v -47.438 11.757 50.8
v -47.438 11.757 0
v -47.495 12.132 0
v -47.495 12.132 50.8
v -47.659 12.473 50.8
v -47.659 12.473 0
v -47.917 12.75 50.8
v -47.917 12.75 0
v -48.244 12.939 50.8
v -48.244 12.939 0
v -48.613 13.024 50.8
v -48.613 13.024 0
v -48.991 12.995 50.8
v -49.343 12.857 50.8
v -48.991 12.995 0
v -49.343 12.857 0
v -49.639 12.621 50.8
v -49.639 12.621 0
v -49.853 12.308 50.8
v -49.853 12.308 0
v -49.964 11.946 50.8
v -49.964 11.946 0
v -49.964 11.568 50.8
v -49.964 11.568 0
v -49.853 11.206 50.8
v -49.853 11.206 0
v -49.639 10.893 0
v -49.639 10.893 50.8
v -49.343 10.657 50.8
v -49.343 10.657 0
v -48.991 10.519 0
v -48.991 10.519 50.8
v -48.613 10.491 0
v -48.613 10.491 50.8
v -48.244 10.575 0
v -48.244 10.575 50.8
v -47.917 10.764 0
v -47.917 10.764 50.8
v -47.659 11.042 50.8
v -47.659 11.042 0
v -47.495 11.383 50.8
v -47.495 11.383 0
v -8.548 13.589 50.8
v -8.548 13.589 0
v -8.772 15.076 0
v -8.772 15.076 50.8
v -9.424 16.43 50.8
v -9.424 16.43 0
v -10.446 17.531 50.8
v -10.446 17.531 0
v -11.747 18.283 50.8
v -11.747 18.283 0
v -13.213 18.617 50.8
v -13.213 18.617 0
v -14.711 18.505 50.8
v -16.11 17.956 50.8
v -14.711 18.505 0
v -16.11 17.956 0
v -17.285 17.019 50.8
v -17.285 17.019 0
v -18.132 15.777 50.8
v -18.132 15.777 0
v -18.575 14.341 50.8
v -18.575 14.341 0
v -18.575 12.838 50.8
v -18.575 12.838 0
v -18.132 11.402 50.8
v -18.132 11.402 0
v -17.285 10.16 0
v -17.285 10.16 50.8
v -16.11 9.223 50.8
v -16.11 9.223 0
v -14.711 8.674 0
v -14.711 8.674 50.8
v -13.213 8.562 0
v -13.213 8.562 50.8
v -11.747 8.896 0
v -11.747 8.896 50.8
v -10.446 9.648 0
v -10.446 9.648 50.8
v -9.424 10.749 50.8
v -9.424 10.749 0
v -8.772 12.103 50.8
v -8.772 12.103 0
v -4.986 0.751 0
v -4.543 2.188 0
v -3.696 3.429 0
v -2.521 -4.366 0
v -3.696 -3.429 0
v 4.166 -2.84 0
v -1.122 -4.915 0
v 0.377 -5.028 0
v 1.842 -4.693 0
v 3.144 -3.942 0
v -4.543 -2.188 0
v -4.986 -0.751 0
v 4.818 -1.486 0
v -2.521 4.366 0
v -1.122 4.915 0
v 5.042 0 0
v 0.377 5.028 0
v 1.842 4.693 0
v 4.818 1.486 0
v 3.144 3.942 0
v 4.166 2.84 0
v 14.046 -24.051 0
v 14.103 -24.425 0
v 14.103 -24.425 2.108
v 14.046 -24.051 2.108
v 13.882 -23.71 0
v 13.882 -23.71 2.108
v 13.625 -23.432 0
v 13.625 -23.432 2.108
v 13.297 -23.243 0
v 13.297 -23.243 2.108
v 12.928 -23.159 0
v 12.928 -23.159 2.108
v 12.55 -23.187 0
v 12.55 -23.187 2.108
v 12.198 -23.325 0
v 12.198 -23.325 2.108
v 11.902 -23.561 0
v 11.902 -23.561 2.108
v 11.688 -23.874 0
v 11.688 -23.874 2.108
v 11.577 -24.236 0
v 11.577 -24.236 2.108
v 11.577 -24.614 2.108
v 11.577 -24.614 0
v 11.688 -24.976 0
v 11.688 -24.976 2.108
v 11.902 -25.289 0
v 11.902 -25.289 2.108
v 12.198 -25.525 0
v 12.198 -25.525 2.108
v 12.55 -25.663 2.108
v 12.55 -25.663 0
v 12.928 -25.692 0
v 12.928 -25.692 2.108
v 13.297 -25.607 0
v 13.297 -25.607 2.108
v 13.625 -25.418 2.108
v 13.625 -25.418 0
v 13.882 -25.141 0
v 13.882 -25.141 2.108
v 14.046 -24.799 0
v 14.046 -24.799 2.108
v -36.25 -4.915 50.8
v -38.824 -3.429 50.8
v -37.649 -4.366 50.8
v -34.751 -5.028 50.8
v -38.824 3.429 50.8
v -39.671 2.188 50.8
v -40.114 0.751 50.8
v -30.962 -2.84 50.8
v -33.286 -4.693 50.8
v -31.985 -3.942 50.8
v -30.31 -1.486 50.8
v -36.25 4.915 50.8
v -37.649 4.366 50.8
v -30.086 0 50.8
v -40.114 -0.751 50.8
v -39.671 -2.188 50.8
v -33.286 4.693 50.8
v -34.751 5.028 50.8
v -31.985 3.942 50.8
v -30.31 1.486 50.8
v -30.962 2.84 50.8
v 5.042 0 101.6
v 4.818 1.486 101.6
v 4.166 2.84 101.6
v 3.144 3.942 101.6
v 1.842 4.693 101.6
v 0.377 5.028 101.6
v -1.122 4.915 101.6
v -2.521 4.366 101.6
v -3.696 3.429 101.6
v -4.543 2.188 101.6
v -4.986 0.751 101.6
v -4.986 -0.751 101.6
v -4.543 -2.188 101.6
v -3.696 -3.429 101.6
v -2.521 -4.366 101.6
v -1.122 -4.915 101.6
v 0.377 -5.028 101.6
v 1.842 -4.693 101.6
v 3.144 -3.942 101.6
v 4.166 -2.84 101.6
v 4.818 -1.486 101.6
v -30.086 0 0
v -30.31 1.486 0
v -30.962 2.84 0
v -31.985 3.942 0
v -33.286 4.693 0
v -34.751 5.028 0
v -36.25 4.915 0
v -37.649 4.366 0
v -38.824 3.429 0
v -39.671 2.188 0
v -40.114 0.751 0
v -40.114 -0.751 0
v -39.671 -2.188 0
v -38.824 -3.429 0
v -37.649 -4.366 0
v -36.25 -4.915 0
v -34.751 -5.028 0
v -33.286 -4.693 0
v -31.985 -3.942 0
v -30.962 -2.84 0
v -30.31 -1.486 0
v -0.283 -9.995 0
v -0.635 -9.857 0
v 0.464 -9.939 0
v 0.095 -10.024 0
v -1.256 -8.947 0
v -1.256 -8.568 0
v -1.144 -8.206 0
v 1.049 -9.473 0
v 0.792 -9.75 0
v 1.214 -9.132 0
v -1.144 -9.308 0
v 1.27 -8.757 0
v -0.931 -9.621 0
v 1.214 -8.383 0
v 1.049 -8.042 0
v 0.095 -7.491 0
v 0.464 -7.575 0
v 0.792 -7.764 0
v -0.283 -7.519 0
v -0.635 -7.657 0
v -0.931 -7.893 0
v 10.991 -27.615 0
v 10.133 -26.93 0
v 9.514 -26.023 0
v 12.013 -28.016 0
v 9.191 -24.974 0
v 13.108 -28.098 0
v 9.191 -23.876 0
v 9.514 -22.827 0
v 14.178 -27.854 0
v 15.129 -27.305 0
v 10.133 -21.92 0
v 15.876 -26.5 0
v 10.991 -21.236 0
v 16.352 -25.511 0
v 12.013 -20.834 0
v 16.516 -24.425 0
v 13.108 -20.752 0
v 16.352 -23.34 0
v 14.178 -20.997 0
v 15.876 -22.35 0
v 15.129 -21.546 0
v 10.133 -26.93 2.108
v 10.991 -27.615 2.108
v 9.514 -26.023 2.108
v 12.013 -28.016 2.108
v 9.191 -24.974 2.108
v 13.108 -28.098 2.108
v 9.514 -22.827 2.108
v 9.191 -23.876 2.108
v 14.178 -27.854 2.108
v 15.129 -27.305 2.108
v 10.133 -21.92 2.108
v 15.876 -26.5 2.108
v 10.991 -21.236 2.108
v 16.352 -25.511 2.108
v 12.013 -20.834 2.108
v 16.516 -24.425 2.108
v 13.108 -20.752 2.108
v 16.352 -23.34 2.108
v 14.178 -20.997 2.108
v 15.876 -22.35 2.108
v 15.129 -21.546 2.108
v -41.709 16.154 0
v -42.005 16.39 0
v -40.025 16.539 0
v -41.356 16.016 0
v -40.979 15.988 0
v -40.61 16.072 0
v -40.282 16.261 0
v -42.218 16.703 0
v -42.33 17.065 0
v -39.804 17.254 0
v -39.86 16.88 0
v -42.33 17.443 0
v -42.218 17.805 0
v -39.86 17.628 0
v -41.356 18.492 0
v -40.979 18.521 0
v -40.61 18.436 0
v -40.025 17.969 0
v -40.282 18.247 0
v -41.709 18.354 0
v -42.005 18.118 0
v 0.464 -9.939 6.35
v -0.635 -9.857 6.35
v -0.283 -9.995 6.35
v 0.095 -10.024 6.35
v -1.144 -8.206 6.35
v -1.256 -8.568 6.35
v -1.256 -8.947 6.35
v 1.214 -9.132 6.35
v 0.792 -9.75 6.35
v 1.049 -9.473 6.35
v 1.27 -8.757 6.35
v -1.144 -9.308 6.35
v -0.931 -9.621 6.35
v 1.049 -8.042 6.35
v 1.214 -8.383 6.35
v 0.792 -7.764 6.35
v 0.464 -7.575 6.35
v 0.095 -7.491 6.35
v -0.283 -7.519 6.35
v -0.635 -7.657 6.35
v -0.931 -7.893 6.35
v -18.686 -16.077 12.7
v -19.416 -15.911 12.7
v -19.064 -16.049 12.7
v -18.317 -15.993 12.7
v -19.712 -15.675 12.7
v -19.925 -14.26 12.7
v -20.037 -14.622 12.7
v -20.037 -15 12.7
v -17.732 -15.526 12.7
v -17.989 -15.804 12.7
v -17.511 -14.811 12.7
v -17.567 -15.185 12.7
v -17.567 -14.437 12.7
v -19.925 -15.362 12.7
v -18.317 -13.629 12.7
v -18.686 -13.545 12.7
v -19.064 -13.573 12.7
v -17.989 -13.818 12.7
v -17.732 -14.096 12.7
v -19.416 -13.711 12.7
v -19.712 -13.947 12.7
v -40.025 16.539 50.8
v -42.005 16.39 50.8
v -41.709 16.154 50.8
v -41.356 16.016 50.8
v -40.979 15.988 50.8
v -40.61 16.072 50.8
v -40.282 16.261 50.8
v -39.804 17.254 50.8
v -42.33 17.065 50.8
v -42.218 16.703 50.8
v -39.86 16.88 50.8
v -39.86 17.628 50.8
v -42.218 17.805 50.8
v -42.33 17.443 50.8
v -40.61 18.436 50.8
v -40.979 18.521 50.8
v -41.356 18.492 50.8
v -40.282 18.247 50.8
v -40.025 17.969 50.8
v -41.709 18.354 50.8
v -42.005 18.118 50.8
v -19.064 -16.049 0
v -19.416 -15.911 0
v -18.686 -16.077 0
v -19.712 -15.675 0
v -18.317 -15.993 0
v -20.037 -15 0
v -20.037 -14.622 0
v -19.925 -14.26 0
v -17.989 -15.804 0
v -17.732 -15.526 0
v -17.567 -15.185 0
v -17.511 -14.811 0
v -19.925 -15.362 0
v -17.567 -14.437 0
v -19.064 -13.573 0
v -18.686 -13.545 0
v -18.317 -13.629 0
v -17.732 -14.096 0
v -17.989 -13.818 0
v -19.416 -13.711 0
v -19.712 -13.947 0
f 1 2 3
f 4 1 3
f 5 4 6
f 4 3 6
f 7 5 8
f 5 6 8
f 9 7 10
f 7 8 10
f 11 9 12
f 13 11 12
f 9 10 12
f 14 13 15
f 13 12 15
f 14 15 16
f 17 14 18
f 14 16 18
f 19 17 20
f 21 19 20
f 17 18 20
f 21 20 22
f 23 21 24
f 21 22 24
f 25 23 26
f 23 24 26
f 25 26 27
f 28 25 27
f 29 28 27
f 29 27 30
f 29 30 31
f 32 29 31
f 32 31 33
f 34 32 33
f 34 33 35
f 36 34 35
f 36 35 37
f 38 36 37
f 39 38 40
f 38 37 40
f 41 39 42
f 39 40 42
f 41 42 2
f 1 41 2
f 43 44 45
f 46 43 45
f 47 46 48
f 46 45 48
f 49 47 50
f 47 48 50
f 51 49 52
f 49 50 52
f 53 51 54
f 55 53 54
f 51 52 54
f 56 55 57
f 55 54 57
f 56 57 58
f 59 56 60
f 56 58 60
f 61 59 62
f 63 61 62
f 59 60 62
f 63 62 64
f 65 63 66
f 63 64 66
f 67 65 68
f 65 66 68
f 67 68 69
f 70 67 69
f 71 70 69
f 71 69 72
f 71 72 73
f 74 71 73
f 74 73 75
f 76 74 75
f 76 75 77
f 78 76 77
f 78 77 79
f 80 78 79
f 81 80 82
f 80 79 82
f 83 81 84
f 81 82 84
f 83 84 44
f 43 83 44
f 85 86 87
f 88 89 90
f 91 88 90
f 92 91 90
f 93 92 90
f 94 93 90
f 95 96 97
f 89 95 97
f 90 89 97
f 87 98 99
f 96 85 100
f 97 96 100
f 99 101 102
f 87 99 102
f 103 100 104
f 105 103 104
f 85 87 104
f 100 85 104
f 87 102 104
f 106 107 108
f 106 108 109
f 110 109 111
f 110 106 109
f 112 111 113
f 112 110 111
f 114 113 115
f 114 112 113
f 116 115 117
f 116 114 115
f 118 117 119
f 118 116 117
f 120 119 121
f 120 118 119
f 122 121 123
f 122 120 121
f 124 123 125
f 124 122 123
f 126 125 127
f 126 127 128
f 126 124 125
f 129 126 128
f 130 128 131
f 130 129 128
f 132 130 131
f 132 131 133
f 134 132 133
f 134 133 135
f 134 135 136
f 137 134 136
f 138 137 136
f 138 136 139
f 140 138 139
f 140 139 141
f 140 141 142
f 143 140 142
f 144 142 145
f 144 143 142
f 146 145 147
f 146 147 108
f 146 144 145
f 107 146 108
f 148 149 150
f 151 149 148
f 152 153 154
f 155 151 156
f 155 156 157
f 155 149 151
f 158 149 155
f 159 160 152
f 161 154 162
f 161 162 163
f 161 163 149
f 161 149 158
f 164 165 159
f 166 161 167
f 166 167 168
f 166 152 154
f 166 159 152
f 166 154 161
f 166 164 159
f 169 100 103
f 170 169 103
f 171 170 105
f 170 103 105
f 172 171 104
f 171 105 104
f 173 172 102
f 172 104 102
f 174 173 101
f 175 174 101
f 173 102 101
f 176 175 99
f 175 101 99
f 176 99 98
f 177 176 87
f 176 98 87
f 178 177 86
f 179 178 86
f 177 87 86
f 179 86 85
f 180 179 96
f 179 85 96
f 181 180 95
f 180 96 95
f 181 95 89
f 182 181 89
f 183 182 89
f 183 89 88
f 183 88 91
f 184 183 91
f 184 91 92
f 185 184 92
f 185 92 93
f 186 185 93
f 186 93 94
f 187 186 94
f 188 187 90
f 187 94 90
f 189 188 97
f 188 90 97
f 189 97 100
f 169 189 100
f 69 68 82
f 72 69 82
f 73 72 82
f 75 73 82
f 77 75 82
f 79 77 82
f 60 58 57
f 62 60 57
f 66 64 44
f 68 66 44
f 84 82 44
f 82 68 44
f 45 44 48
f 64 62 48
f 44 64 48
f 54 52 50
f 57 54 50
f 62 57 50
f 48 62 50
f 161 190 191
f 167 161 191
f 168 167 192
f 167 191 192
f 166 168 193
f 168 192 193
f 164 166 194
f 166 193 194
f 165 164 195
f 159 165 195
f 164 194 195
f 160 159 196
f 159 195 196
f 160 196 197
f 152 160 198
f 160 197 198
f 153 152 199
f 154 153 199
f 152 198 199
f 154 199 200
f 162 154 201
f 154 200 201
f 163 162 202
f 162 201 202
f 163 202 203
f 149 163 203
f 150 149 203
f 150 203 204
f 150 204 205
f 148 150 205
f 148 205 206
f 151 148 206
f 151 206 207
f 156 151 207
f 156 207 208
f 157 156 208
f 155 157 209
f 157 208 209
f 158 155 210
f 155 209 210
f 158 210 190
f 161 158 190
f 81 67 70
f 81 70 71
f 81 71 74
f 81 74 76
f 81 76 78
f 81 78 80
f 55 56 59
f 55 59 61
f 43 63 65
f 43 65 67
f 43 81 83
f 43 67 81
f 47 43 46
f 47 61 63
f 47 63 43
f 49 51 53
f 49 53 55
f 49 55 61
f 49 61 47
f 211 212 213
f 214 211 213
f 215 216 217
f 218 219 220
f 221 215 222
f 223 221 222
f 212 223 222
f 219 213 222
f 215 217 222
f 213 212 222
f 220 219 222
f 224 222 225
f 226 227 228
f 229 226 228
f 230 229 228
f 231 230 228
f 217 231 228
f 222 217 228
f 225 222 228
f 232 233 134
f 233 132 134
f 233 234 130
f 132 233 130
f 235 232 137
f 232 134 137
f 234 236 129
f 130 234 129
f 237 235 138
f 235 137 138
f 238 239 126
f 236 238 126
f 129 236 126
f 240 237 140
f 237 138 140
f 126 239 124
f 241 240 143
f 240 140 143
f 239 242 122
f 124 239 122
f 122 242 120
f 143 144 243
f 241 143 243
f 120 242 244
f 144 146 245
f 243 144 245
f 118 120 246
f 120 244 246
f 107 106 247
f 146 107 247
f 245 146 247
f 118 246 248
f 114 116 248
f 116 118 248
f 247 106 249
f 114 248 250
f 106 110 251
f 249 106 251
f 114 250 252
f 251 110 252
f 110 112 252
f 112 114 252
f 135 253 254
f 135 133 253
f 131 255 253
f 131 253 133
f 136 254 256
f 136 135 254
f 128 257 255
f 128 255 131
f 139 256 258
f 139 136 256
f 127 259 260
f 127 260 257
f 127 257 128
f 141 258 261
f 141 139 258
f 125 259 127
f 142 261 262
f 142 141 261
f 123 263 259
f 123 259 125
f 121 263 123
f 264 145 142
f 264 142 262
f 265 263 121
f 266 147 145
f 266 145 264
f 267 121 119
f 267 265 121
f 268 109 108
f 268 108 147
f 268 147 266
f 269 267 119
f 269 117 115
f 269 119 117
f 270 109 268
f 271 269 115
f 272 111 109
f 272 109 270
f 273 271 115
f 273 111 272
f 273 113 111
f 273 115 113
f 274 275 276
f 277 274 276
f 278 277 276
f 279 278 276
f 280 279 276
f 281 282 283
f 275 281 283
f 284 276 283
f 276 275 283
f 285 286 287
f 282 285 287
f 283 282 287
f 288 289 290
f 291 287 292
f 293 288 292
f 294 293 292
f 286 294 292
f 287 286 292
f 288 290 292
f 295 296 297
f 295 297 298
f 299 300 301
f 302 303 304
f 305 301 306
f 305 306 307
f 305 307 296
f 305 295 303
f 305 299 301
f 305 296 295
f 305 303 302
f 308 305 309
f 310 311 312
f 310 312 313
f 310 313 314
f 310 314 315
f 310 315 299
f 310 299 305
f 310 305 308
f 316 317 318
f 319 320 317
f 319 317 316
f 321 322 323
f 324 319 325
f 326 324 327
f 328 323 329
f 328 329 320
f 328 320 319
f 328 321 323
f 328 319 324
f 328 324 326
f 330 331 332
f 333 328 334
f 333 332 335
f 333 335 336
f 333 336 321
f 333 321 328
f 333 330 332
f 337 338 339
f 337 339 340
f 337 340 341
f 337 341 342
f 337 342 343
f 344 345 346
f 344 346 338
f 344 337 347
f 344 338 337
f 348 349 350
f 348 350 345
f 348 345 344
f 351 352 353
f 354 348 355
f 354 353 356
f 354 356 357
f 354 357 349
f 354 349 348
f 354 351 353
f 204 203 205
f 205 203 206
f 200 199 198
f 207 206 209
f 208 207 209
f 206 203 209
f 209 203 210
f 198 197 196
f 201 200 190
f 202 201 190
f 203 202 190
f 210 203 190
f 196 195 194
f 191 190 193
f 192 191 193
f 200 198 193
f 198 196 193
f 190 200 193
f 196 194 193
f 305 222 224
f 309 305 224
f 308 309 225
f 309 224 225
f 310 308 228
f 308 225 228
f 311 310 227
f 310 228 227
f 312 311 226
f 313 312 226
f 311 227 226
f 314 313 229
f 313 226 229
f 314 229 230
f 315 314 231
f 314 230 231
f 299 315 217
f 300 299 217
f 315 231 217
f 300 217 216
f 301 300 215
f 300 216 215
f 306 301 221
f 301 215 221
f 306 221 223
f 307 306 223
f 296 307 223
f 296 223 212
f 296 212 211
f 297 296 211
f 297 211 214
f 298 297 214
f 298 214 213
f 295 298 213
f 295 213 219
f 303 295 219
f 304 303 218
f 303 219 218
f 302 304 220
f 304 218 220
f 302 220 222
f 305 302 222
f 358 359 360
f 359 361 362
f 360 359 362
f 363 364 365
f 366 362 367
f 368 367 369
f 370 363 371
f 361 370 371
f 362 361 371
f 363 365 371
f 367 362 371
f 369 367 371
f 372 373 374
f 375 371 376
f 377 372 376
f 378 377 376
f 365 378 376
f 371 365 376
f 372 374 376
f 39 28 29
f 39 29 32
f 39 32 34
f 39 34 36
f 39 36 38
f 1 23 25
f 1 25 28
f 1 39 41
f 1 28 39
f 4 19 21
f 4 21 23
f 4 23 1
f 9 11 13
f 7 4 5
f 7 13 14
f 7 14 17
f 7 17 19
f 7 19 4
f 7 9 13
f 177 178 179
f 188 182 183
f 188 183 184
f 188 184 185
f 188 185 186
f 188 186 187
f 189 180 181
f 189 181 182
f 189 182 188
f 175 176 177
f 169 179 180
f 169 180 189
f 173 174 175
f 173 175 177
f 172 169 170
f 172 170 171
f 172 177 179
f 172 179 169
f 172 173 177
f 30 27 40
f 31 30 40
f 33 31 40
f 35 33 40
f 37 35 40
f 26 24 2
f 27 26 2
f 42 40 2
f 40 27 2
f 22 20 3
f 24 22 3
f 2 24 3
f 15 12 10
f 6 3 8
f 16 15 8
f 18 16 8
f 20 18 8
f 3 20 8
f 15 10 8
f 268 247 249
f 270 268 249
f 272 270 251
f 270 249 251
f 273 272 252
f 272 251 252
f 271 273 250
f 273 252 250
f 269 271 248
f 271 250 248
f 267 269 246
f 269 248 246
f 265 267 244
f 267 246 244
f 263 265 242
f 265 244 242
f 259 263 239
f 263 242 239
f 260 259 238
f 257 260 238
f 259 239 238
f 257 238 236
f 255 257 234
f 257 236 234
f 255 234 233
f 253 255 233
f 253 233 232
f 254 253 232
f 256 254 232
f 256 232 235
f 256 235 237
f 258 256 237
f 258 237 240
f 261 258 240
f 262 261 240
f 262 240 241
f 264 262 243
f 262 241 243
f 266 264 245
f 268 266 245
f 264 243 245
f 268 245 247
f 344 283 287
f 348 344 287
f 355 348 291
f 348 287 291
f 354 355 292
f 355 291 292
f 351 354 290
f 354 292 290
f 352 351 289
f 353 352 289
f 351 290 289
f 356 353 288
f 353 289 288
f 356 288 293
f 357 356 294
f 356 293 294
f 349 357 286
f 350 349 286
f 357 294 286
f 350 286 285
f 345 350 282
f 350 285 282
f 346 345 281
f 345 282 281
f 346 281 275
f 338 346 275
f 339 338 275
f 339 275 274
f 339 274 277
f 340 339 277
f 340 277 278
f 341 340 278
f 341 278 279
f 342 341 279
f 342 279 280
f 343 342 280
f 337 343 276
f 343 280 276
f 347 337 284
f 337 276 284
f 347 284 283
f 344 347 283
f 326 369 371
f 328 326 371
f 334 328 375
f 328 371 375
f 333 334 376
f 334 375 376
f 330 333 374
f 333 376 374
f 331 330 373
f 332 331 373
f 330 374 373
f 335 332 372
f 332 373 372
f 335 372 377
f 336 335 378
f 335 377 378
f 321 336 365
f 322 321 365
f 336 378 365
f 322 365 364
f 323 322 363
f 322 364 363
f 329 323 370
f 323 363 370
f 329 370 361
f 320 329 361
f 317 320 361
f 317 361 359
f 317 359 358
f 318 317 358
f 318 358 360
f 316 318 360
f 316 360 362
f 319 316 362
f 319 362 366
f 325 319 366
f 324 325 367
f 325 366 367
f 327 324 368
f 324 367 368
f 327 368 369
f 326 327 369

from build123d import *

# Parameters (mm, degrees)
F0_R     = 5.0419
F1_DEPTH = 101.6
F2_R     = 5.0419
F2_R_2   = 1.27
F3_DEPTH = 50.8
F4_R     = 1.27
F5_DEPTH = 6.35
F6_R     = 3.683
F6_R_2   = 1.27
F7_DEPTH = 2.1082
F8_R     = 1.27
F9_DEPTH = 12.7


with BuildPart() as f1:
    # F0 (on Top) → F1 (new body)
    with BuildSketch(Plane.XY):
        Circle(F0_R)
    extrude(amount=F1_DEPTH)


with BuildPart() as f3:
    # F2 (on Top) → F3 (new body)
    with BuildSketch(Plane.XY):
        with Locations((-35.128241, 0)):
            Circle(F2_R)
        with Locations((-13.589485, 13.589485)):
            Circle(F2_R)
        with Locations((-41.073836, 17.254066)):
            Circle(F2_R_2)
        with Locations((-48.708379, 11.757195)):
            Circle(F2_R_2)
    extrude(amount=F3_DEPTH)


with BuildPart() as f5:
    # F4 (on Top) → F5 (new body)
    with BuildSketch(Plane.XY):
        with Locations((0, -8.75725)):
            Circle(F4_R)
    extrude(amount=F5_DEPTH)


with BuildPart() as f7:
    # F6 (on Top) → F7 (new body)
    with BuildSketch(Plane.XY):
        with Locations((12.832678, -24.425155)):
            Circle(F6_R)
        with Locations((12.832678, -24.425155)):
            Circle(F6_R_2, mode=Mode.SUBTRACT)
    extrude(amount=F7_DEPTH)


with BuildPart() as f9:
    # F8 (on Top) → F9 (new body)
    with BuildSketch(Plane.XY):
        with Locations((-18.780973, -14.811012)):
            Circle(F8_R)
    extrude(amount=F9_DEPTH)


solid = Compound([f1.part, f3.part, f5.part, f7.part, f9.part])
